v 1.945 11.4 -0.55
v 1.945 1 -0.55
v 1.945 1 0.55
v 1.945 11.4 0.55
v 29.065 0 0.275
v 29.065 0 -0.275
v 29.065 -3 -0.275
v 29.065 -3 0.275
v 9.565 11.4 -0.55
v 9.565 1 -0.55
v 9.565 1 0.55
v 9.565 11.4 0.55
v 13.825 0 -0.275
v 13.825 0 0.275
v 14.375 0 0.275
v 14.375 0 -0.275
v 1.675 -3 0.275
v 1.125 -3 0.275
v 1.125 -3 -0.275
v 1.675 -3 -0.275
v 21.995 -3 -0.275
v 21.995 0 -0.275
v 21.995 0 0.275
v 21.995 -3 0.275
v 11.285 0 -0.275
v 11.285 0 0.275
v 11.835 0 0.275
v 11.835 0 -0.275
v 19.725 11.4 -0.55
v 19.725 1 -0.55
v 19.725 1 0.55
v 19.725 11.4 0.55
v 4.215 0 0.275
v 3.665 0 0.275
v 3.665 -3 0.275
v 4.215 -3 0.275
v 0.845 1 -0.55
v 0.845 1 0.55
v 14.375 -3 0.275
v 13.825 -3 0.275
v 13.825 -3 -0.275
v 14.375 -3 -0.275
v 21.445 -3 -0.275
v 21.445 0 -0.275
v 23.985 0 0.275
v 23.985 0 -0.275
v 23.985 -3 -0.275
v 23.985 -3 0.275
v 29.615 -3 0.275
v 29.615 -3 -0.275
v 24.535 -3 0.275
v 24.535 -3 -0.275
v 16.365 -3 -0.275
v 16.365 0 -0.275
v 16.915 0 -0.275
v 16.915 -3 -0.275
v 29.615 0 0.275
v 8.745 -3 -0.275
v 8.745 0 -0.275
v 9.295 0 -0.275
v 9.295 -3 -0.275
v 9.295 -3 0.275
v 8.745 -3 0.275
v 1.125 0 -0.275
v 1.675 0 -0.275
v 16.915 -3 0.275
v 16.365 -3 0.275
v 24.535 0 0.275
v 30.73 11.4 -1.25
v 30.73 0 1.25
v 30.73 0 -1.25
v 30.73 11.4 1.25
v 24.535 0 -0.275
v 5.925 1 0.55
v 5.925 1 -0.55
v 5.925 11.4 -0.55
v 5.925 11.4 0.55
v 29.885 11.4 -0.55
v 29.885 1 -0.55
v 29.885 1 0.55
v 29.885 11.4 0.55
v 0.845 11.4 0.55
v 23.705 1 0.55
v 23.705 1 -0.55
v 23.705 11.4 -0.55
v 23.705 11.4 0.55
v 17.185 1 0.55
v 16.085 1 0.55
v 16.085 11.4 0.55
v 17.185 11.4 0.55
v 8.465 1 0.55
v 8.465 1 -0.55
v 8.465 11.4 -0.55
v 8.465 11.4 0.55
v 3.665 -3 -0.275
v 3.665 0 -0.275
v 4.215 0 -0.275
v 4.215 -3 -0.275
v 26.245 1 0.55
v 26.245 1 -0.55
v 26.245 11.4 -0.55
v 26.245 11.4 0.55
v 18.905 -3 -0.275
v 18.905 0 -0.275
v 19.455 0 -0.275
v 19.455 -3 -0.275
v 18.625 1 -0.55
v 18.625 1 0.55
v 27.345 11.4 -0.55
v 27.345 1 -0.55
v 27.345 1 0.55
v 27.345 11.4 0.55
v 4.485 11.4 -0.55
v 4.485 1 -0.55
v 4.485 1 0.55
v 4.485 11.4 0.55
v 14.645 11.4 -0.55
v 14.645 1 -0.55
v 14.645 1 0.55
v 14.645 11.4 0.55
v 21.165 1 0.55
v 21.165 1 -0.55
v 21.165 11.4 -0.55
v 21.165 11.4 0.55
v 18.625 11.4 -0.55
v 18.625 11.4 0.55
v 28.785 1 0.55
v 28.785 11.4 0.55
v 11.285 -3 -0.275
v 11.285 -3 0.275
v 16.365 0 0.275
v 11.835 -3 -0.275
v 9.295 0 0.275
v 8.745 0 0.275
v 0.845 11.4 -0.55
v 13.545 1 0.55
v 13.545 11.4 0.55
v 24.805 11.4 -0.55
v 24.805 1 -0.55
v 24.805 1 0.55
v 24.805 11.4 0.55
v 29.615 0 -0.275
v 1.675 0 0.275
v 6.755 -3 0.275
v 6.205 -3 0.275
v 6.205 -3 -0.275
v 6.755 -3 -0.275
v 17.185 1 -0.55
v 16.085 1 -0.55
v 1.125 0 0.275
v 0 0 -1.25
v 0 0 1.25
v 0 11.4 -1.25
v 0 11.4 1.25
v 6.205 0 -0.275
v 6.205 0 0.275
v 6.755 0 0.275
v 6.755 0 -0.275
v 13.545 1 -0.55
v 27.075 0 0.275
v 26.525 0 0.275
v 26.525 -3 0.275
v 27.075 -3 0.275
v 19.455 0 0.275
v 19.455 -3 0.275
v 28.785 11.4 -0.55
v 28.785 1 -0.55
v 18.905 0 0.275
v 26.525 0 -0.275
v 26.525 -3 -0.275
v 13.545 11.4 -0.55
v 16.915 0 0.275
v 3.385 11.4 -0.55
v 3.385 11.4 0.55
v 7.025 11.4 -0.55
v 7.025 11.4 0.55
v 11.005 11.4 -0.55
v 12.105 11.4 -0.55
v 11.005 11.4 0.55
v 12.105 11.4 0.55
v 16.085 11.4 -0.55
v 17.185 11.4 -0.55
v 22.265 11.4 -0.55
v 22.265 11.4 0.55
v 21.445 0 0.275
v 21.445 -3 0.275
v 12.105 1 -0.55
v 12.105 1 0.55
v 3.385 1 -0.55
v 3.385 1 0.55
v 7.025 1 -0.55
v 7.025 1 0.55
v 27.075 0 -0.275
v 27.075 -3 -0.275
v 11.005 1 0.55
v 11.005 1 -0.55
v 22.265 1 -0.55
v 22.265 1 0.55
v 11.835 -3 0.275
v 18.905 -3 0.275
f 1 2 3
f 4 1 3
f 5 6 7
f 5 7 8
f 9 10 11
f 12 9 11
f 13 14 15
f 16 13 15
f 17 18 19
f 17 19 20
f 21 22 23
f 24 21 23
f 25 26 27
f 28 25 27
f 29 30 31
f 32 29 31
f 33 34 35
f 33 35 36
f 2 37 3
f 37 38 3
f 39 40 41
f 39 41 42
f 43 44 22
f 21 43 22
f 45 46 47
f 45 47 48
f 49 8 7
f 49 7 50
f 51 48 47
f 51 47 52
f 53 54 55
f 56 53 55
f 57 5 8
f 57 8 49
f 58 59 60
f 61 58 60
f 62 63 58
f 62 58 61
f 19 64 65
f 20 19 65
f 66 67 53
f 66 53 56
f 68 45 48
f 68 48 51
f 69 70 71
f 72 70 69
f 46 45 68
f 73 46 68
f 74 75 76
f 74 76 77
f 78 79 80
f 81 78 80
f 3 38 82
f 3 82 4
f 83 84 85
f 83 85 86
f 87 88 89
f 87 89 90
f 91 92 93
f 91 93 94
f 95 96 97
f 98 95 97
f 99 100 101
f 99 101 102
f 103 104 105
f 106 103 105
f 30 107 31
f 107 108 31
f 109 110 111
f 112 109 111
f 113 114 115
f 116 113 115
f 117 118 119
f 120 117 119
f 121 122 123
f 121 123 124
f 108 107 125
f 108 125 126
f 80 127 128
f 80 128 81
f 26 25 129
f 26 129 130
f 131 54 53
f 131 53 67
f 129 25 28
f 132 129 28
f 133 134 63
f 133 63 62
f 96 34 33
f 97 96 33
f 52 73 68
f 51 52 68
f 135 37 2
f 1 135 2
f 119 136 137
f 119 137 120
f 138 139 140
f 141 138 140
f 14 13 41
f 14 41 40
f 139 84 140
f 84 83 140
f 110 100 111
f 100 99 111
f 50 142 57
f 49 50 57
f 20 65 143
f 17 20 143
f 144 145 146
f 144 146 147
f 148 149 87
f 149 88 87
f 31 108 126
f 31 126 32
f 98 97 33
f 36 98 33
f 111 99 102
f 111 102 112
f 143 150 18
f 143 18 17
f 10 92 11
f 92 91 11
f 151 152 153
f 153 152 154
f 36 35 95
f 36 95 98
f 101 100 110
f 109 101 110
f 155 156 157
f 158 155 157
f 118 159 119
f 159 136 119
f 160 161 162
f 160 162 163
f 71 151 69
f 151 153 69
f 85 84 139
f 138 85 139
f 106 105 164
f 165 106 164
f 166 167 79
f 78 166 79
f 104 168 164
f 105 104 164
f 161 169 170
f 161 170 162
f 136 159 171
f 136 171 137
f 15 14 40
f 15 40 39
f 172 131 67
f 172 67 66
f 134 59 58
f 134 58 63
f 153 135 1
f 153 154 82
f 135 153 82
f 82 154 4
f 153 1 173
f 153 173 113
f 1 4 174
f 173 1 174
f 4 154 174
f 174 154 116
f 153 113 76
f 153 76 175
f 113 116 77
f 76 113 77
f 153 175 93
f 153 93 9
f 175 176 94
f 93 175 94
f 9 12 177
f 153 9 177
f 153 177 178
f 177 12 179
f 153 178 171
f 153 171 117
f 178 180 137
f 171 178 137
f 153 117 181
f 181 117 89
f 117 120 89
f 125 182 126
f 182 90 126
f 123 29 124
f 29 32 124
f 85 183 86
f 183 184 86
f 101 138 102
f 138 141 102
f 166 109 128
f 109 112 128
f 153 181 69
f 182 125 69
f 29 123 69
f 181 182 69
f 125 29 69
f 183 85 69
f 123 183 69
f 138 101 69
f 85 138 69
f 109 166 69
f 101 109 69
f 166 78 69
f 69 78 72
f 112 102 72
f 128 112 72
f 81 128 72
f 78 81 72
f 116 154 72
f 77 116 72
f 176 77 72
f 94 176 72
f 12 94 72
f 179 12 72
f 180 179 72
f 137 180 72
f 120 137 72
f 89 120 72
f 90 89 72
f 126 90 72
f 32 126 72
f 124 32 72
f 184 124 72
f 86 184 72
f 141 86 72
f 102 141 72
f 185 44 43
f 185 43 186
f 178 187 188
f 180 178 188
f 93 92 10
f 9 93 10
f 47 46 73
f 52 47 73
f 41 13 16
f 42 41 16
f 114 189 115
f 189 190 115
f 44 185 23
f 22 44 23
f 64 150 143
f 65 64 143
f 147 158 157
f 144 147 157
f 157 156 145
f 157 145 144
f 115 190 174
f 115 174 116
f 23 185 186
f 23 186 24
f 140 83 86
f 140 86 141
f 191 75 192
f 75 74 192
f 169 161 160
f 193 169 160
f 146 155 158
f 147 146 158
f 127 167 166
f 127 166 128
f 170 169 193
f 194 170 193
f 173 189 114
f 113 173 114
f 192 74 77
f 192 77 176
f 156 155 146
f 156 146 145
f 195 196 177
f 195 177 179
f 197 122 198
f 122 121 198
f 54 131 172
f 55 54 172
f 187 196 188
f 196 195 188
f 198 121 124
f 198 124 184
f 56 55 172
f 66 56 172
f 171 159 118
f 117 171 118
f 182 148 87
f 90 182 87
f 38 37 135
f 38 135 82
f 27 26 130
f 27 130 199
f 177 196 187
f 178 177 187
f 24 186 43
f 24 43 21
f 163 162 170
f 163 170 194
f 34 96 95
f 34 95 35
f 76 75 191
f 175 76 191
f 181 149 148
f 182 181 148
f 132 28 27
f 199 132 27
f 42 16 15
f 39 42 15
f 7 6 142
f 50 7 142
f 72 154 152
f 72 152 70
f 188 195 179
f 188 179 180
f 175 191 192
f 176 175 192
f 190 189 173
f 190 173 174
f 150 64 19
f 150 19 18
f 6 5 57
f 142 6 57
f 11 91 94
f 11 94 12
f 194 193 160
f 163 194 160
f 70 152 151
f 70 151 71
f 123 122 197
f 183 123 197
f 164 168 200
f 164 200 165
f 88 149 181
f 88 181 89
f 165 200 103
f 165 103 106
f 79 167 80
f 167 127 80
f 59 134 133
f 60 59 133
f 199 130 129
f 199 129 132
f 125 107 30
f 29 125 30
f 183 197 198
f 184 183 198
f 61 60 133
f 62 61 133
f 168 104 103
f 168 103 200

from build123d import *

# Parameters (mm, degrees)
SKETCH1_W              = 30.73
SKETCH1_H              = 11.4
BOSS_EXTRUDE1_DEPTH    = 1.25
SKETCH2_W              = 1.1
SKETCH2_H              = 1.1
CUT_EXTRUDE1_DEPTH     = 12.4
SKETCH3_W              = 30.73
SKETCH3_H              = 2.5
BOSS_EXTRUDE2_DEPTH    = 1
SKETCH4_W              = 0.55
SKETCH4_H              = 0.55
BOSS_EXTRUDE3_DEPTH    = 3
BOSS_EXTRUDE3_2_DEPTH  = 3
BOSS_EXTRUDE3_3_DEPTH  = 3
BOSS_EXTRUDE3_4_DEPTH  = 3
BOSS_EXTRUDE3_5_DEPTH  = 3
BOSS_EXTRUDE3_6_DEPTH  = 3
BOSS_EXTRUDE3_7_DEPTH  = 3
BOSS_EXTRUDE3_8_DEPTH  = 3
BOSS_EXTRUDE3_9_DEPTH  = 3
BOSS_EXTRUDE3_10_DEPTH = 3
BOSS_EXTRUDE3_11_DEPTH = 3
BOSS_EXTRUDE3_12_DEPTH = 3


with BuildPart() as part:
    # Sketch1 → Boss-Extrude1 (new body, symmetric)
    with BuildSketch(Plane.XY):
        with Locations((15.365, 5.7)):
            Rectangle(SKETCH1_W, SKETCH1_H)
    extrude(amount=BOSS_EXTRUDE1_DEPTH, both=True)

    # Sketch2 → Cut-Extrude1 (cut, through all)
    with BuildSketch(Plane.XZ):
        with Locations((3.935, 0)):
            Rectangle(SKETCH2_W, SKETCH2_H)
        with Locations((1.395, 0)):
            Rectangle(SKETCH2_W, SKETCH2_H)
        with Locations((6.475, 0)):
            Rectangle(SKETCH2_W, SKETCH2_H)
        with Locations((9.015, 0)):
            Rectangle(SKETCH2_W, SKETCH2_H)
        with Locations((11.555, 0)):
            Rectangle(SKETCH2_W, SKETCH2_H)
        with Locations((14.095, 0)):
            Rectangle(SKETCH2_W, SKETCH2_H)
        with Locations((16.635, 0)):
            Rectangle(SKETCH2_W, SKETCH2_H)
        with Locations((19.175, 0)):
            Rectangle(SKETCH2_W, SKETCH2_H)
        with Locations((21.715, 0)):
            Rectangle(SKETCH2_W, SKETCH2_H)
        with Locations((24.255, 0)):
            Rectangle(SKETCH2_W, SKETCH2_H)
        with Locations((26.795, 0)):
            Rectangle(SKETCH2_W, SKETCH2_H)
        with Locations((29.335, 0)):
            Rectangle(SKETCH2_W, SKETCH2_H)
    extrude(amount=-CUT_EXTRUDE1_DEPTH, mode=Mode.SUBTRACT)

    # Sketch3 → Boss-Extrude2 (add)
    with BuildSketch(Plane.XZ):
        with Locations((15.365, 0)):
            Rectangle(SKETCH3_W, SKETCH3_H)
    extrude(amount=-BOSS_EXTRUDE2_DEPTH)


with BuildPart() as body_2:
    # Sketch4 → Boss-Extrude3 (new body)
    with BuildSketch(Plane.XZ):
        with Locations((1.4, 0)):
            Rectangle(SKETCH4_W, SKETCH4_H)
    extrude(amount=BOSS_EXTRUDE3_DEPTH)


with BuildPart() as body_3:
    # Sketch4 → Boss-Extrude3 2 (new body)
    with BuildSketch(Plane.XZ):
        with Locations((3.94, 0)):
            Rectangle(SKETCH4_W, SKETCH4_H)
    extrude(amount=BOSS_EXTRUDE3_2_DEPTH)


with BuildPart() as body_4:
    # Sketch4 → Boss-Extrude3 3 (new body)
    with BuildSketch(Plane.XZ):
        with Locations((6.48, 0)):
            Rectangle(SKETCH4_W, SKETCH4_H)
    extrude(amount=BOSS_EXTRUDE3_3_DEPTH)


with BuildPart() as body_5:
    # Sketch4 → Boss-Extrude3 4 (new body)
    with BuildSketch(Plane.XZ):
        with Locations((9.02, 0)):
            Rectangle(SKETCH4_W, SKETCH4_H)
    extrude(amount=BOSS_EXTRUDE3_4_DEPTH)


with BuildPart() as body_6:
    # Sketch4 → Boss-Extrude3 5 (new body)
    with BuildSketch(Plane.XZ):
        with Locations((11.56, 0)):
            Rectangle(SKETCH4_W, SKETCH4_H)
    extrude(amount=BOSS_EXTRUDE3_5_DEPTH)


with BuildPart() as body_7:
    # Sketch4 → Boss-Extrude3 6 (new body)
    with BuildSketch(Plane.XZ):
        with Locations((14.1, 0)):
            Rectangle(SKETCH4_W, SKETCH4_H)
    extrude(amount=BOSS_EXTRUDE3_6_DEPTH)


with BuildPart() as body_8:
    # Sketch4 → Boss-Extrude3 7 (new body)
    with BuildSketch(Plane.XZ):
        with Locations((16.64, 0)):
            Rectangle(SKETCH4_W, SKETCH4_H)
    extrude(amount=BOSS_EXTRUDE3_7_DEPTH)


with BuildPart() as body_9:
    # Sketch4 → Boss-Extrude3 8 (new body)
    with BuildSketch(Plane.XZ):
        with Locations((19.18, 0)):
            Rectangle(SKETCH4_W, SKETCH4_H)
    extrude(amount=BOSS_EXTRUDE3_8_DEPTH)


with BuildPart() as body_10:
    # Sketch4 → Boss-Extrude3 9 (new body)
    with BuildSketch(Plane.XZ):
        with Locations((21.72, 0)):
            Rectangle(SKETCH4_W, SKETCH4_H)
    extrude(amount=BOSS_EXTRUDE3_9_DEPTH)


with BuildPart() as body_11:
    # Sketch4 → Boss-Extrude3 10 (new body)
    with BuildSketch(Plane.XZ):
        with Locations((24.26, 0)):
            Rectangle(SKETCH4_W, SKETCH4_H)
    extrude(amount=BOSS_EXTRUDE3_10_DEPTH)


with BuildPart() as body_12:
    # Sketch4 → Boss-Extrude3 11 (new body)
    with BuildSketch(Plane.XZ):
        with Locations((26.8, 0)):
            Rectangle(SKETCH4_W, SKETCH4_H)
    extrude(amount=BOSS_EXTRUDE3_11_DEPTH)


with BuildPart() as body_13:
    # Sketch4 → Boss-Extrude3 12 (new body)
    with BuildSketch(Plane.XZ):
        with Locations((29.34, 0)):
            Rectangle(SKETCH4_W, SKETCH4_H)
    extrude(amount=BOSS_EXTRUDE3_12_DEPTH)


solid = Compound([part.part, body_2.part, body_3.part, body_4.part, body_5.part, body_6.part, body_7.part, body_8.part, body_9.part, body_10.part, body_11.part, body_12.part, body_13.part])
